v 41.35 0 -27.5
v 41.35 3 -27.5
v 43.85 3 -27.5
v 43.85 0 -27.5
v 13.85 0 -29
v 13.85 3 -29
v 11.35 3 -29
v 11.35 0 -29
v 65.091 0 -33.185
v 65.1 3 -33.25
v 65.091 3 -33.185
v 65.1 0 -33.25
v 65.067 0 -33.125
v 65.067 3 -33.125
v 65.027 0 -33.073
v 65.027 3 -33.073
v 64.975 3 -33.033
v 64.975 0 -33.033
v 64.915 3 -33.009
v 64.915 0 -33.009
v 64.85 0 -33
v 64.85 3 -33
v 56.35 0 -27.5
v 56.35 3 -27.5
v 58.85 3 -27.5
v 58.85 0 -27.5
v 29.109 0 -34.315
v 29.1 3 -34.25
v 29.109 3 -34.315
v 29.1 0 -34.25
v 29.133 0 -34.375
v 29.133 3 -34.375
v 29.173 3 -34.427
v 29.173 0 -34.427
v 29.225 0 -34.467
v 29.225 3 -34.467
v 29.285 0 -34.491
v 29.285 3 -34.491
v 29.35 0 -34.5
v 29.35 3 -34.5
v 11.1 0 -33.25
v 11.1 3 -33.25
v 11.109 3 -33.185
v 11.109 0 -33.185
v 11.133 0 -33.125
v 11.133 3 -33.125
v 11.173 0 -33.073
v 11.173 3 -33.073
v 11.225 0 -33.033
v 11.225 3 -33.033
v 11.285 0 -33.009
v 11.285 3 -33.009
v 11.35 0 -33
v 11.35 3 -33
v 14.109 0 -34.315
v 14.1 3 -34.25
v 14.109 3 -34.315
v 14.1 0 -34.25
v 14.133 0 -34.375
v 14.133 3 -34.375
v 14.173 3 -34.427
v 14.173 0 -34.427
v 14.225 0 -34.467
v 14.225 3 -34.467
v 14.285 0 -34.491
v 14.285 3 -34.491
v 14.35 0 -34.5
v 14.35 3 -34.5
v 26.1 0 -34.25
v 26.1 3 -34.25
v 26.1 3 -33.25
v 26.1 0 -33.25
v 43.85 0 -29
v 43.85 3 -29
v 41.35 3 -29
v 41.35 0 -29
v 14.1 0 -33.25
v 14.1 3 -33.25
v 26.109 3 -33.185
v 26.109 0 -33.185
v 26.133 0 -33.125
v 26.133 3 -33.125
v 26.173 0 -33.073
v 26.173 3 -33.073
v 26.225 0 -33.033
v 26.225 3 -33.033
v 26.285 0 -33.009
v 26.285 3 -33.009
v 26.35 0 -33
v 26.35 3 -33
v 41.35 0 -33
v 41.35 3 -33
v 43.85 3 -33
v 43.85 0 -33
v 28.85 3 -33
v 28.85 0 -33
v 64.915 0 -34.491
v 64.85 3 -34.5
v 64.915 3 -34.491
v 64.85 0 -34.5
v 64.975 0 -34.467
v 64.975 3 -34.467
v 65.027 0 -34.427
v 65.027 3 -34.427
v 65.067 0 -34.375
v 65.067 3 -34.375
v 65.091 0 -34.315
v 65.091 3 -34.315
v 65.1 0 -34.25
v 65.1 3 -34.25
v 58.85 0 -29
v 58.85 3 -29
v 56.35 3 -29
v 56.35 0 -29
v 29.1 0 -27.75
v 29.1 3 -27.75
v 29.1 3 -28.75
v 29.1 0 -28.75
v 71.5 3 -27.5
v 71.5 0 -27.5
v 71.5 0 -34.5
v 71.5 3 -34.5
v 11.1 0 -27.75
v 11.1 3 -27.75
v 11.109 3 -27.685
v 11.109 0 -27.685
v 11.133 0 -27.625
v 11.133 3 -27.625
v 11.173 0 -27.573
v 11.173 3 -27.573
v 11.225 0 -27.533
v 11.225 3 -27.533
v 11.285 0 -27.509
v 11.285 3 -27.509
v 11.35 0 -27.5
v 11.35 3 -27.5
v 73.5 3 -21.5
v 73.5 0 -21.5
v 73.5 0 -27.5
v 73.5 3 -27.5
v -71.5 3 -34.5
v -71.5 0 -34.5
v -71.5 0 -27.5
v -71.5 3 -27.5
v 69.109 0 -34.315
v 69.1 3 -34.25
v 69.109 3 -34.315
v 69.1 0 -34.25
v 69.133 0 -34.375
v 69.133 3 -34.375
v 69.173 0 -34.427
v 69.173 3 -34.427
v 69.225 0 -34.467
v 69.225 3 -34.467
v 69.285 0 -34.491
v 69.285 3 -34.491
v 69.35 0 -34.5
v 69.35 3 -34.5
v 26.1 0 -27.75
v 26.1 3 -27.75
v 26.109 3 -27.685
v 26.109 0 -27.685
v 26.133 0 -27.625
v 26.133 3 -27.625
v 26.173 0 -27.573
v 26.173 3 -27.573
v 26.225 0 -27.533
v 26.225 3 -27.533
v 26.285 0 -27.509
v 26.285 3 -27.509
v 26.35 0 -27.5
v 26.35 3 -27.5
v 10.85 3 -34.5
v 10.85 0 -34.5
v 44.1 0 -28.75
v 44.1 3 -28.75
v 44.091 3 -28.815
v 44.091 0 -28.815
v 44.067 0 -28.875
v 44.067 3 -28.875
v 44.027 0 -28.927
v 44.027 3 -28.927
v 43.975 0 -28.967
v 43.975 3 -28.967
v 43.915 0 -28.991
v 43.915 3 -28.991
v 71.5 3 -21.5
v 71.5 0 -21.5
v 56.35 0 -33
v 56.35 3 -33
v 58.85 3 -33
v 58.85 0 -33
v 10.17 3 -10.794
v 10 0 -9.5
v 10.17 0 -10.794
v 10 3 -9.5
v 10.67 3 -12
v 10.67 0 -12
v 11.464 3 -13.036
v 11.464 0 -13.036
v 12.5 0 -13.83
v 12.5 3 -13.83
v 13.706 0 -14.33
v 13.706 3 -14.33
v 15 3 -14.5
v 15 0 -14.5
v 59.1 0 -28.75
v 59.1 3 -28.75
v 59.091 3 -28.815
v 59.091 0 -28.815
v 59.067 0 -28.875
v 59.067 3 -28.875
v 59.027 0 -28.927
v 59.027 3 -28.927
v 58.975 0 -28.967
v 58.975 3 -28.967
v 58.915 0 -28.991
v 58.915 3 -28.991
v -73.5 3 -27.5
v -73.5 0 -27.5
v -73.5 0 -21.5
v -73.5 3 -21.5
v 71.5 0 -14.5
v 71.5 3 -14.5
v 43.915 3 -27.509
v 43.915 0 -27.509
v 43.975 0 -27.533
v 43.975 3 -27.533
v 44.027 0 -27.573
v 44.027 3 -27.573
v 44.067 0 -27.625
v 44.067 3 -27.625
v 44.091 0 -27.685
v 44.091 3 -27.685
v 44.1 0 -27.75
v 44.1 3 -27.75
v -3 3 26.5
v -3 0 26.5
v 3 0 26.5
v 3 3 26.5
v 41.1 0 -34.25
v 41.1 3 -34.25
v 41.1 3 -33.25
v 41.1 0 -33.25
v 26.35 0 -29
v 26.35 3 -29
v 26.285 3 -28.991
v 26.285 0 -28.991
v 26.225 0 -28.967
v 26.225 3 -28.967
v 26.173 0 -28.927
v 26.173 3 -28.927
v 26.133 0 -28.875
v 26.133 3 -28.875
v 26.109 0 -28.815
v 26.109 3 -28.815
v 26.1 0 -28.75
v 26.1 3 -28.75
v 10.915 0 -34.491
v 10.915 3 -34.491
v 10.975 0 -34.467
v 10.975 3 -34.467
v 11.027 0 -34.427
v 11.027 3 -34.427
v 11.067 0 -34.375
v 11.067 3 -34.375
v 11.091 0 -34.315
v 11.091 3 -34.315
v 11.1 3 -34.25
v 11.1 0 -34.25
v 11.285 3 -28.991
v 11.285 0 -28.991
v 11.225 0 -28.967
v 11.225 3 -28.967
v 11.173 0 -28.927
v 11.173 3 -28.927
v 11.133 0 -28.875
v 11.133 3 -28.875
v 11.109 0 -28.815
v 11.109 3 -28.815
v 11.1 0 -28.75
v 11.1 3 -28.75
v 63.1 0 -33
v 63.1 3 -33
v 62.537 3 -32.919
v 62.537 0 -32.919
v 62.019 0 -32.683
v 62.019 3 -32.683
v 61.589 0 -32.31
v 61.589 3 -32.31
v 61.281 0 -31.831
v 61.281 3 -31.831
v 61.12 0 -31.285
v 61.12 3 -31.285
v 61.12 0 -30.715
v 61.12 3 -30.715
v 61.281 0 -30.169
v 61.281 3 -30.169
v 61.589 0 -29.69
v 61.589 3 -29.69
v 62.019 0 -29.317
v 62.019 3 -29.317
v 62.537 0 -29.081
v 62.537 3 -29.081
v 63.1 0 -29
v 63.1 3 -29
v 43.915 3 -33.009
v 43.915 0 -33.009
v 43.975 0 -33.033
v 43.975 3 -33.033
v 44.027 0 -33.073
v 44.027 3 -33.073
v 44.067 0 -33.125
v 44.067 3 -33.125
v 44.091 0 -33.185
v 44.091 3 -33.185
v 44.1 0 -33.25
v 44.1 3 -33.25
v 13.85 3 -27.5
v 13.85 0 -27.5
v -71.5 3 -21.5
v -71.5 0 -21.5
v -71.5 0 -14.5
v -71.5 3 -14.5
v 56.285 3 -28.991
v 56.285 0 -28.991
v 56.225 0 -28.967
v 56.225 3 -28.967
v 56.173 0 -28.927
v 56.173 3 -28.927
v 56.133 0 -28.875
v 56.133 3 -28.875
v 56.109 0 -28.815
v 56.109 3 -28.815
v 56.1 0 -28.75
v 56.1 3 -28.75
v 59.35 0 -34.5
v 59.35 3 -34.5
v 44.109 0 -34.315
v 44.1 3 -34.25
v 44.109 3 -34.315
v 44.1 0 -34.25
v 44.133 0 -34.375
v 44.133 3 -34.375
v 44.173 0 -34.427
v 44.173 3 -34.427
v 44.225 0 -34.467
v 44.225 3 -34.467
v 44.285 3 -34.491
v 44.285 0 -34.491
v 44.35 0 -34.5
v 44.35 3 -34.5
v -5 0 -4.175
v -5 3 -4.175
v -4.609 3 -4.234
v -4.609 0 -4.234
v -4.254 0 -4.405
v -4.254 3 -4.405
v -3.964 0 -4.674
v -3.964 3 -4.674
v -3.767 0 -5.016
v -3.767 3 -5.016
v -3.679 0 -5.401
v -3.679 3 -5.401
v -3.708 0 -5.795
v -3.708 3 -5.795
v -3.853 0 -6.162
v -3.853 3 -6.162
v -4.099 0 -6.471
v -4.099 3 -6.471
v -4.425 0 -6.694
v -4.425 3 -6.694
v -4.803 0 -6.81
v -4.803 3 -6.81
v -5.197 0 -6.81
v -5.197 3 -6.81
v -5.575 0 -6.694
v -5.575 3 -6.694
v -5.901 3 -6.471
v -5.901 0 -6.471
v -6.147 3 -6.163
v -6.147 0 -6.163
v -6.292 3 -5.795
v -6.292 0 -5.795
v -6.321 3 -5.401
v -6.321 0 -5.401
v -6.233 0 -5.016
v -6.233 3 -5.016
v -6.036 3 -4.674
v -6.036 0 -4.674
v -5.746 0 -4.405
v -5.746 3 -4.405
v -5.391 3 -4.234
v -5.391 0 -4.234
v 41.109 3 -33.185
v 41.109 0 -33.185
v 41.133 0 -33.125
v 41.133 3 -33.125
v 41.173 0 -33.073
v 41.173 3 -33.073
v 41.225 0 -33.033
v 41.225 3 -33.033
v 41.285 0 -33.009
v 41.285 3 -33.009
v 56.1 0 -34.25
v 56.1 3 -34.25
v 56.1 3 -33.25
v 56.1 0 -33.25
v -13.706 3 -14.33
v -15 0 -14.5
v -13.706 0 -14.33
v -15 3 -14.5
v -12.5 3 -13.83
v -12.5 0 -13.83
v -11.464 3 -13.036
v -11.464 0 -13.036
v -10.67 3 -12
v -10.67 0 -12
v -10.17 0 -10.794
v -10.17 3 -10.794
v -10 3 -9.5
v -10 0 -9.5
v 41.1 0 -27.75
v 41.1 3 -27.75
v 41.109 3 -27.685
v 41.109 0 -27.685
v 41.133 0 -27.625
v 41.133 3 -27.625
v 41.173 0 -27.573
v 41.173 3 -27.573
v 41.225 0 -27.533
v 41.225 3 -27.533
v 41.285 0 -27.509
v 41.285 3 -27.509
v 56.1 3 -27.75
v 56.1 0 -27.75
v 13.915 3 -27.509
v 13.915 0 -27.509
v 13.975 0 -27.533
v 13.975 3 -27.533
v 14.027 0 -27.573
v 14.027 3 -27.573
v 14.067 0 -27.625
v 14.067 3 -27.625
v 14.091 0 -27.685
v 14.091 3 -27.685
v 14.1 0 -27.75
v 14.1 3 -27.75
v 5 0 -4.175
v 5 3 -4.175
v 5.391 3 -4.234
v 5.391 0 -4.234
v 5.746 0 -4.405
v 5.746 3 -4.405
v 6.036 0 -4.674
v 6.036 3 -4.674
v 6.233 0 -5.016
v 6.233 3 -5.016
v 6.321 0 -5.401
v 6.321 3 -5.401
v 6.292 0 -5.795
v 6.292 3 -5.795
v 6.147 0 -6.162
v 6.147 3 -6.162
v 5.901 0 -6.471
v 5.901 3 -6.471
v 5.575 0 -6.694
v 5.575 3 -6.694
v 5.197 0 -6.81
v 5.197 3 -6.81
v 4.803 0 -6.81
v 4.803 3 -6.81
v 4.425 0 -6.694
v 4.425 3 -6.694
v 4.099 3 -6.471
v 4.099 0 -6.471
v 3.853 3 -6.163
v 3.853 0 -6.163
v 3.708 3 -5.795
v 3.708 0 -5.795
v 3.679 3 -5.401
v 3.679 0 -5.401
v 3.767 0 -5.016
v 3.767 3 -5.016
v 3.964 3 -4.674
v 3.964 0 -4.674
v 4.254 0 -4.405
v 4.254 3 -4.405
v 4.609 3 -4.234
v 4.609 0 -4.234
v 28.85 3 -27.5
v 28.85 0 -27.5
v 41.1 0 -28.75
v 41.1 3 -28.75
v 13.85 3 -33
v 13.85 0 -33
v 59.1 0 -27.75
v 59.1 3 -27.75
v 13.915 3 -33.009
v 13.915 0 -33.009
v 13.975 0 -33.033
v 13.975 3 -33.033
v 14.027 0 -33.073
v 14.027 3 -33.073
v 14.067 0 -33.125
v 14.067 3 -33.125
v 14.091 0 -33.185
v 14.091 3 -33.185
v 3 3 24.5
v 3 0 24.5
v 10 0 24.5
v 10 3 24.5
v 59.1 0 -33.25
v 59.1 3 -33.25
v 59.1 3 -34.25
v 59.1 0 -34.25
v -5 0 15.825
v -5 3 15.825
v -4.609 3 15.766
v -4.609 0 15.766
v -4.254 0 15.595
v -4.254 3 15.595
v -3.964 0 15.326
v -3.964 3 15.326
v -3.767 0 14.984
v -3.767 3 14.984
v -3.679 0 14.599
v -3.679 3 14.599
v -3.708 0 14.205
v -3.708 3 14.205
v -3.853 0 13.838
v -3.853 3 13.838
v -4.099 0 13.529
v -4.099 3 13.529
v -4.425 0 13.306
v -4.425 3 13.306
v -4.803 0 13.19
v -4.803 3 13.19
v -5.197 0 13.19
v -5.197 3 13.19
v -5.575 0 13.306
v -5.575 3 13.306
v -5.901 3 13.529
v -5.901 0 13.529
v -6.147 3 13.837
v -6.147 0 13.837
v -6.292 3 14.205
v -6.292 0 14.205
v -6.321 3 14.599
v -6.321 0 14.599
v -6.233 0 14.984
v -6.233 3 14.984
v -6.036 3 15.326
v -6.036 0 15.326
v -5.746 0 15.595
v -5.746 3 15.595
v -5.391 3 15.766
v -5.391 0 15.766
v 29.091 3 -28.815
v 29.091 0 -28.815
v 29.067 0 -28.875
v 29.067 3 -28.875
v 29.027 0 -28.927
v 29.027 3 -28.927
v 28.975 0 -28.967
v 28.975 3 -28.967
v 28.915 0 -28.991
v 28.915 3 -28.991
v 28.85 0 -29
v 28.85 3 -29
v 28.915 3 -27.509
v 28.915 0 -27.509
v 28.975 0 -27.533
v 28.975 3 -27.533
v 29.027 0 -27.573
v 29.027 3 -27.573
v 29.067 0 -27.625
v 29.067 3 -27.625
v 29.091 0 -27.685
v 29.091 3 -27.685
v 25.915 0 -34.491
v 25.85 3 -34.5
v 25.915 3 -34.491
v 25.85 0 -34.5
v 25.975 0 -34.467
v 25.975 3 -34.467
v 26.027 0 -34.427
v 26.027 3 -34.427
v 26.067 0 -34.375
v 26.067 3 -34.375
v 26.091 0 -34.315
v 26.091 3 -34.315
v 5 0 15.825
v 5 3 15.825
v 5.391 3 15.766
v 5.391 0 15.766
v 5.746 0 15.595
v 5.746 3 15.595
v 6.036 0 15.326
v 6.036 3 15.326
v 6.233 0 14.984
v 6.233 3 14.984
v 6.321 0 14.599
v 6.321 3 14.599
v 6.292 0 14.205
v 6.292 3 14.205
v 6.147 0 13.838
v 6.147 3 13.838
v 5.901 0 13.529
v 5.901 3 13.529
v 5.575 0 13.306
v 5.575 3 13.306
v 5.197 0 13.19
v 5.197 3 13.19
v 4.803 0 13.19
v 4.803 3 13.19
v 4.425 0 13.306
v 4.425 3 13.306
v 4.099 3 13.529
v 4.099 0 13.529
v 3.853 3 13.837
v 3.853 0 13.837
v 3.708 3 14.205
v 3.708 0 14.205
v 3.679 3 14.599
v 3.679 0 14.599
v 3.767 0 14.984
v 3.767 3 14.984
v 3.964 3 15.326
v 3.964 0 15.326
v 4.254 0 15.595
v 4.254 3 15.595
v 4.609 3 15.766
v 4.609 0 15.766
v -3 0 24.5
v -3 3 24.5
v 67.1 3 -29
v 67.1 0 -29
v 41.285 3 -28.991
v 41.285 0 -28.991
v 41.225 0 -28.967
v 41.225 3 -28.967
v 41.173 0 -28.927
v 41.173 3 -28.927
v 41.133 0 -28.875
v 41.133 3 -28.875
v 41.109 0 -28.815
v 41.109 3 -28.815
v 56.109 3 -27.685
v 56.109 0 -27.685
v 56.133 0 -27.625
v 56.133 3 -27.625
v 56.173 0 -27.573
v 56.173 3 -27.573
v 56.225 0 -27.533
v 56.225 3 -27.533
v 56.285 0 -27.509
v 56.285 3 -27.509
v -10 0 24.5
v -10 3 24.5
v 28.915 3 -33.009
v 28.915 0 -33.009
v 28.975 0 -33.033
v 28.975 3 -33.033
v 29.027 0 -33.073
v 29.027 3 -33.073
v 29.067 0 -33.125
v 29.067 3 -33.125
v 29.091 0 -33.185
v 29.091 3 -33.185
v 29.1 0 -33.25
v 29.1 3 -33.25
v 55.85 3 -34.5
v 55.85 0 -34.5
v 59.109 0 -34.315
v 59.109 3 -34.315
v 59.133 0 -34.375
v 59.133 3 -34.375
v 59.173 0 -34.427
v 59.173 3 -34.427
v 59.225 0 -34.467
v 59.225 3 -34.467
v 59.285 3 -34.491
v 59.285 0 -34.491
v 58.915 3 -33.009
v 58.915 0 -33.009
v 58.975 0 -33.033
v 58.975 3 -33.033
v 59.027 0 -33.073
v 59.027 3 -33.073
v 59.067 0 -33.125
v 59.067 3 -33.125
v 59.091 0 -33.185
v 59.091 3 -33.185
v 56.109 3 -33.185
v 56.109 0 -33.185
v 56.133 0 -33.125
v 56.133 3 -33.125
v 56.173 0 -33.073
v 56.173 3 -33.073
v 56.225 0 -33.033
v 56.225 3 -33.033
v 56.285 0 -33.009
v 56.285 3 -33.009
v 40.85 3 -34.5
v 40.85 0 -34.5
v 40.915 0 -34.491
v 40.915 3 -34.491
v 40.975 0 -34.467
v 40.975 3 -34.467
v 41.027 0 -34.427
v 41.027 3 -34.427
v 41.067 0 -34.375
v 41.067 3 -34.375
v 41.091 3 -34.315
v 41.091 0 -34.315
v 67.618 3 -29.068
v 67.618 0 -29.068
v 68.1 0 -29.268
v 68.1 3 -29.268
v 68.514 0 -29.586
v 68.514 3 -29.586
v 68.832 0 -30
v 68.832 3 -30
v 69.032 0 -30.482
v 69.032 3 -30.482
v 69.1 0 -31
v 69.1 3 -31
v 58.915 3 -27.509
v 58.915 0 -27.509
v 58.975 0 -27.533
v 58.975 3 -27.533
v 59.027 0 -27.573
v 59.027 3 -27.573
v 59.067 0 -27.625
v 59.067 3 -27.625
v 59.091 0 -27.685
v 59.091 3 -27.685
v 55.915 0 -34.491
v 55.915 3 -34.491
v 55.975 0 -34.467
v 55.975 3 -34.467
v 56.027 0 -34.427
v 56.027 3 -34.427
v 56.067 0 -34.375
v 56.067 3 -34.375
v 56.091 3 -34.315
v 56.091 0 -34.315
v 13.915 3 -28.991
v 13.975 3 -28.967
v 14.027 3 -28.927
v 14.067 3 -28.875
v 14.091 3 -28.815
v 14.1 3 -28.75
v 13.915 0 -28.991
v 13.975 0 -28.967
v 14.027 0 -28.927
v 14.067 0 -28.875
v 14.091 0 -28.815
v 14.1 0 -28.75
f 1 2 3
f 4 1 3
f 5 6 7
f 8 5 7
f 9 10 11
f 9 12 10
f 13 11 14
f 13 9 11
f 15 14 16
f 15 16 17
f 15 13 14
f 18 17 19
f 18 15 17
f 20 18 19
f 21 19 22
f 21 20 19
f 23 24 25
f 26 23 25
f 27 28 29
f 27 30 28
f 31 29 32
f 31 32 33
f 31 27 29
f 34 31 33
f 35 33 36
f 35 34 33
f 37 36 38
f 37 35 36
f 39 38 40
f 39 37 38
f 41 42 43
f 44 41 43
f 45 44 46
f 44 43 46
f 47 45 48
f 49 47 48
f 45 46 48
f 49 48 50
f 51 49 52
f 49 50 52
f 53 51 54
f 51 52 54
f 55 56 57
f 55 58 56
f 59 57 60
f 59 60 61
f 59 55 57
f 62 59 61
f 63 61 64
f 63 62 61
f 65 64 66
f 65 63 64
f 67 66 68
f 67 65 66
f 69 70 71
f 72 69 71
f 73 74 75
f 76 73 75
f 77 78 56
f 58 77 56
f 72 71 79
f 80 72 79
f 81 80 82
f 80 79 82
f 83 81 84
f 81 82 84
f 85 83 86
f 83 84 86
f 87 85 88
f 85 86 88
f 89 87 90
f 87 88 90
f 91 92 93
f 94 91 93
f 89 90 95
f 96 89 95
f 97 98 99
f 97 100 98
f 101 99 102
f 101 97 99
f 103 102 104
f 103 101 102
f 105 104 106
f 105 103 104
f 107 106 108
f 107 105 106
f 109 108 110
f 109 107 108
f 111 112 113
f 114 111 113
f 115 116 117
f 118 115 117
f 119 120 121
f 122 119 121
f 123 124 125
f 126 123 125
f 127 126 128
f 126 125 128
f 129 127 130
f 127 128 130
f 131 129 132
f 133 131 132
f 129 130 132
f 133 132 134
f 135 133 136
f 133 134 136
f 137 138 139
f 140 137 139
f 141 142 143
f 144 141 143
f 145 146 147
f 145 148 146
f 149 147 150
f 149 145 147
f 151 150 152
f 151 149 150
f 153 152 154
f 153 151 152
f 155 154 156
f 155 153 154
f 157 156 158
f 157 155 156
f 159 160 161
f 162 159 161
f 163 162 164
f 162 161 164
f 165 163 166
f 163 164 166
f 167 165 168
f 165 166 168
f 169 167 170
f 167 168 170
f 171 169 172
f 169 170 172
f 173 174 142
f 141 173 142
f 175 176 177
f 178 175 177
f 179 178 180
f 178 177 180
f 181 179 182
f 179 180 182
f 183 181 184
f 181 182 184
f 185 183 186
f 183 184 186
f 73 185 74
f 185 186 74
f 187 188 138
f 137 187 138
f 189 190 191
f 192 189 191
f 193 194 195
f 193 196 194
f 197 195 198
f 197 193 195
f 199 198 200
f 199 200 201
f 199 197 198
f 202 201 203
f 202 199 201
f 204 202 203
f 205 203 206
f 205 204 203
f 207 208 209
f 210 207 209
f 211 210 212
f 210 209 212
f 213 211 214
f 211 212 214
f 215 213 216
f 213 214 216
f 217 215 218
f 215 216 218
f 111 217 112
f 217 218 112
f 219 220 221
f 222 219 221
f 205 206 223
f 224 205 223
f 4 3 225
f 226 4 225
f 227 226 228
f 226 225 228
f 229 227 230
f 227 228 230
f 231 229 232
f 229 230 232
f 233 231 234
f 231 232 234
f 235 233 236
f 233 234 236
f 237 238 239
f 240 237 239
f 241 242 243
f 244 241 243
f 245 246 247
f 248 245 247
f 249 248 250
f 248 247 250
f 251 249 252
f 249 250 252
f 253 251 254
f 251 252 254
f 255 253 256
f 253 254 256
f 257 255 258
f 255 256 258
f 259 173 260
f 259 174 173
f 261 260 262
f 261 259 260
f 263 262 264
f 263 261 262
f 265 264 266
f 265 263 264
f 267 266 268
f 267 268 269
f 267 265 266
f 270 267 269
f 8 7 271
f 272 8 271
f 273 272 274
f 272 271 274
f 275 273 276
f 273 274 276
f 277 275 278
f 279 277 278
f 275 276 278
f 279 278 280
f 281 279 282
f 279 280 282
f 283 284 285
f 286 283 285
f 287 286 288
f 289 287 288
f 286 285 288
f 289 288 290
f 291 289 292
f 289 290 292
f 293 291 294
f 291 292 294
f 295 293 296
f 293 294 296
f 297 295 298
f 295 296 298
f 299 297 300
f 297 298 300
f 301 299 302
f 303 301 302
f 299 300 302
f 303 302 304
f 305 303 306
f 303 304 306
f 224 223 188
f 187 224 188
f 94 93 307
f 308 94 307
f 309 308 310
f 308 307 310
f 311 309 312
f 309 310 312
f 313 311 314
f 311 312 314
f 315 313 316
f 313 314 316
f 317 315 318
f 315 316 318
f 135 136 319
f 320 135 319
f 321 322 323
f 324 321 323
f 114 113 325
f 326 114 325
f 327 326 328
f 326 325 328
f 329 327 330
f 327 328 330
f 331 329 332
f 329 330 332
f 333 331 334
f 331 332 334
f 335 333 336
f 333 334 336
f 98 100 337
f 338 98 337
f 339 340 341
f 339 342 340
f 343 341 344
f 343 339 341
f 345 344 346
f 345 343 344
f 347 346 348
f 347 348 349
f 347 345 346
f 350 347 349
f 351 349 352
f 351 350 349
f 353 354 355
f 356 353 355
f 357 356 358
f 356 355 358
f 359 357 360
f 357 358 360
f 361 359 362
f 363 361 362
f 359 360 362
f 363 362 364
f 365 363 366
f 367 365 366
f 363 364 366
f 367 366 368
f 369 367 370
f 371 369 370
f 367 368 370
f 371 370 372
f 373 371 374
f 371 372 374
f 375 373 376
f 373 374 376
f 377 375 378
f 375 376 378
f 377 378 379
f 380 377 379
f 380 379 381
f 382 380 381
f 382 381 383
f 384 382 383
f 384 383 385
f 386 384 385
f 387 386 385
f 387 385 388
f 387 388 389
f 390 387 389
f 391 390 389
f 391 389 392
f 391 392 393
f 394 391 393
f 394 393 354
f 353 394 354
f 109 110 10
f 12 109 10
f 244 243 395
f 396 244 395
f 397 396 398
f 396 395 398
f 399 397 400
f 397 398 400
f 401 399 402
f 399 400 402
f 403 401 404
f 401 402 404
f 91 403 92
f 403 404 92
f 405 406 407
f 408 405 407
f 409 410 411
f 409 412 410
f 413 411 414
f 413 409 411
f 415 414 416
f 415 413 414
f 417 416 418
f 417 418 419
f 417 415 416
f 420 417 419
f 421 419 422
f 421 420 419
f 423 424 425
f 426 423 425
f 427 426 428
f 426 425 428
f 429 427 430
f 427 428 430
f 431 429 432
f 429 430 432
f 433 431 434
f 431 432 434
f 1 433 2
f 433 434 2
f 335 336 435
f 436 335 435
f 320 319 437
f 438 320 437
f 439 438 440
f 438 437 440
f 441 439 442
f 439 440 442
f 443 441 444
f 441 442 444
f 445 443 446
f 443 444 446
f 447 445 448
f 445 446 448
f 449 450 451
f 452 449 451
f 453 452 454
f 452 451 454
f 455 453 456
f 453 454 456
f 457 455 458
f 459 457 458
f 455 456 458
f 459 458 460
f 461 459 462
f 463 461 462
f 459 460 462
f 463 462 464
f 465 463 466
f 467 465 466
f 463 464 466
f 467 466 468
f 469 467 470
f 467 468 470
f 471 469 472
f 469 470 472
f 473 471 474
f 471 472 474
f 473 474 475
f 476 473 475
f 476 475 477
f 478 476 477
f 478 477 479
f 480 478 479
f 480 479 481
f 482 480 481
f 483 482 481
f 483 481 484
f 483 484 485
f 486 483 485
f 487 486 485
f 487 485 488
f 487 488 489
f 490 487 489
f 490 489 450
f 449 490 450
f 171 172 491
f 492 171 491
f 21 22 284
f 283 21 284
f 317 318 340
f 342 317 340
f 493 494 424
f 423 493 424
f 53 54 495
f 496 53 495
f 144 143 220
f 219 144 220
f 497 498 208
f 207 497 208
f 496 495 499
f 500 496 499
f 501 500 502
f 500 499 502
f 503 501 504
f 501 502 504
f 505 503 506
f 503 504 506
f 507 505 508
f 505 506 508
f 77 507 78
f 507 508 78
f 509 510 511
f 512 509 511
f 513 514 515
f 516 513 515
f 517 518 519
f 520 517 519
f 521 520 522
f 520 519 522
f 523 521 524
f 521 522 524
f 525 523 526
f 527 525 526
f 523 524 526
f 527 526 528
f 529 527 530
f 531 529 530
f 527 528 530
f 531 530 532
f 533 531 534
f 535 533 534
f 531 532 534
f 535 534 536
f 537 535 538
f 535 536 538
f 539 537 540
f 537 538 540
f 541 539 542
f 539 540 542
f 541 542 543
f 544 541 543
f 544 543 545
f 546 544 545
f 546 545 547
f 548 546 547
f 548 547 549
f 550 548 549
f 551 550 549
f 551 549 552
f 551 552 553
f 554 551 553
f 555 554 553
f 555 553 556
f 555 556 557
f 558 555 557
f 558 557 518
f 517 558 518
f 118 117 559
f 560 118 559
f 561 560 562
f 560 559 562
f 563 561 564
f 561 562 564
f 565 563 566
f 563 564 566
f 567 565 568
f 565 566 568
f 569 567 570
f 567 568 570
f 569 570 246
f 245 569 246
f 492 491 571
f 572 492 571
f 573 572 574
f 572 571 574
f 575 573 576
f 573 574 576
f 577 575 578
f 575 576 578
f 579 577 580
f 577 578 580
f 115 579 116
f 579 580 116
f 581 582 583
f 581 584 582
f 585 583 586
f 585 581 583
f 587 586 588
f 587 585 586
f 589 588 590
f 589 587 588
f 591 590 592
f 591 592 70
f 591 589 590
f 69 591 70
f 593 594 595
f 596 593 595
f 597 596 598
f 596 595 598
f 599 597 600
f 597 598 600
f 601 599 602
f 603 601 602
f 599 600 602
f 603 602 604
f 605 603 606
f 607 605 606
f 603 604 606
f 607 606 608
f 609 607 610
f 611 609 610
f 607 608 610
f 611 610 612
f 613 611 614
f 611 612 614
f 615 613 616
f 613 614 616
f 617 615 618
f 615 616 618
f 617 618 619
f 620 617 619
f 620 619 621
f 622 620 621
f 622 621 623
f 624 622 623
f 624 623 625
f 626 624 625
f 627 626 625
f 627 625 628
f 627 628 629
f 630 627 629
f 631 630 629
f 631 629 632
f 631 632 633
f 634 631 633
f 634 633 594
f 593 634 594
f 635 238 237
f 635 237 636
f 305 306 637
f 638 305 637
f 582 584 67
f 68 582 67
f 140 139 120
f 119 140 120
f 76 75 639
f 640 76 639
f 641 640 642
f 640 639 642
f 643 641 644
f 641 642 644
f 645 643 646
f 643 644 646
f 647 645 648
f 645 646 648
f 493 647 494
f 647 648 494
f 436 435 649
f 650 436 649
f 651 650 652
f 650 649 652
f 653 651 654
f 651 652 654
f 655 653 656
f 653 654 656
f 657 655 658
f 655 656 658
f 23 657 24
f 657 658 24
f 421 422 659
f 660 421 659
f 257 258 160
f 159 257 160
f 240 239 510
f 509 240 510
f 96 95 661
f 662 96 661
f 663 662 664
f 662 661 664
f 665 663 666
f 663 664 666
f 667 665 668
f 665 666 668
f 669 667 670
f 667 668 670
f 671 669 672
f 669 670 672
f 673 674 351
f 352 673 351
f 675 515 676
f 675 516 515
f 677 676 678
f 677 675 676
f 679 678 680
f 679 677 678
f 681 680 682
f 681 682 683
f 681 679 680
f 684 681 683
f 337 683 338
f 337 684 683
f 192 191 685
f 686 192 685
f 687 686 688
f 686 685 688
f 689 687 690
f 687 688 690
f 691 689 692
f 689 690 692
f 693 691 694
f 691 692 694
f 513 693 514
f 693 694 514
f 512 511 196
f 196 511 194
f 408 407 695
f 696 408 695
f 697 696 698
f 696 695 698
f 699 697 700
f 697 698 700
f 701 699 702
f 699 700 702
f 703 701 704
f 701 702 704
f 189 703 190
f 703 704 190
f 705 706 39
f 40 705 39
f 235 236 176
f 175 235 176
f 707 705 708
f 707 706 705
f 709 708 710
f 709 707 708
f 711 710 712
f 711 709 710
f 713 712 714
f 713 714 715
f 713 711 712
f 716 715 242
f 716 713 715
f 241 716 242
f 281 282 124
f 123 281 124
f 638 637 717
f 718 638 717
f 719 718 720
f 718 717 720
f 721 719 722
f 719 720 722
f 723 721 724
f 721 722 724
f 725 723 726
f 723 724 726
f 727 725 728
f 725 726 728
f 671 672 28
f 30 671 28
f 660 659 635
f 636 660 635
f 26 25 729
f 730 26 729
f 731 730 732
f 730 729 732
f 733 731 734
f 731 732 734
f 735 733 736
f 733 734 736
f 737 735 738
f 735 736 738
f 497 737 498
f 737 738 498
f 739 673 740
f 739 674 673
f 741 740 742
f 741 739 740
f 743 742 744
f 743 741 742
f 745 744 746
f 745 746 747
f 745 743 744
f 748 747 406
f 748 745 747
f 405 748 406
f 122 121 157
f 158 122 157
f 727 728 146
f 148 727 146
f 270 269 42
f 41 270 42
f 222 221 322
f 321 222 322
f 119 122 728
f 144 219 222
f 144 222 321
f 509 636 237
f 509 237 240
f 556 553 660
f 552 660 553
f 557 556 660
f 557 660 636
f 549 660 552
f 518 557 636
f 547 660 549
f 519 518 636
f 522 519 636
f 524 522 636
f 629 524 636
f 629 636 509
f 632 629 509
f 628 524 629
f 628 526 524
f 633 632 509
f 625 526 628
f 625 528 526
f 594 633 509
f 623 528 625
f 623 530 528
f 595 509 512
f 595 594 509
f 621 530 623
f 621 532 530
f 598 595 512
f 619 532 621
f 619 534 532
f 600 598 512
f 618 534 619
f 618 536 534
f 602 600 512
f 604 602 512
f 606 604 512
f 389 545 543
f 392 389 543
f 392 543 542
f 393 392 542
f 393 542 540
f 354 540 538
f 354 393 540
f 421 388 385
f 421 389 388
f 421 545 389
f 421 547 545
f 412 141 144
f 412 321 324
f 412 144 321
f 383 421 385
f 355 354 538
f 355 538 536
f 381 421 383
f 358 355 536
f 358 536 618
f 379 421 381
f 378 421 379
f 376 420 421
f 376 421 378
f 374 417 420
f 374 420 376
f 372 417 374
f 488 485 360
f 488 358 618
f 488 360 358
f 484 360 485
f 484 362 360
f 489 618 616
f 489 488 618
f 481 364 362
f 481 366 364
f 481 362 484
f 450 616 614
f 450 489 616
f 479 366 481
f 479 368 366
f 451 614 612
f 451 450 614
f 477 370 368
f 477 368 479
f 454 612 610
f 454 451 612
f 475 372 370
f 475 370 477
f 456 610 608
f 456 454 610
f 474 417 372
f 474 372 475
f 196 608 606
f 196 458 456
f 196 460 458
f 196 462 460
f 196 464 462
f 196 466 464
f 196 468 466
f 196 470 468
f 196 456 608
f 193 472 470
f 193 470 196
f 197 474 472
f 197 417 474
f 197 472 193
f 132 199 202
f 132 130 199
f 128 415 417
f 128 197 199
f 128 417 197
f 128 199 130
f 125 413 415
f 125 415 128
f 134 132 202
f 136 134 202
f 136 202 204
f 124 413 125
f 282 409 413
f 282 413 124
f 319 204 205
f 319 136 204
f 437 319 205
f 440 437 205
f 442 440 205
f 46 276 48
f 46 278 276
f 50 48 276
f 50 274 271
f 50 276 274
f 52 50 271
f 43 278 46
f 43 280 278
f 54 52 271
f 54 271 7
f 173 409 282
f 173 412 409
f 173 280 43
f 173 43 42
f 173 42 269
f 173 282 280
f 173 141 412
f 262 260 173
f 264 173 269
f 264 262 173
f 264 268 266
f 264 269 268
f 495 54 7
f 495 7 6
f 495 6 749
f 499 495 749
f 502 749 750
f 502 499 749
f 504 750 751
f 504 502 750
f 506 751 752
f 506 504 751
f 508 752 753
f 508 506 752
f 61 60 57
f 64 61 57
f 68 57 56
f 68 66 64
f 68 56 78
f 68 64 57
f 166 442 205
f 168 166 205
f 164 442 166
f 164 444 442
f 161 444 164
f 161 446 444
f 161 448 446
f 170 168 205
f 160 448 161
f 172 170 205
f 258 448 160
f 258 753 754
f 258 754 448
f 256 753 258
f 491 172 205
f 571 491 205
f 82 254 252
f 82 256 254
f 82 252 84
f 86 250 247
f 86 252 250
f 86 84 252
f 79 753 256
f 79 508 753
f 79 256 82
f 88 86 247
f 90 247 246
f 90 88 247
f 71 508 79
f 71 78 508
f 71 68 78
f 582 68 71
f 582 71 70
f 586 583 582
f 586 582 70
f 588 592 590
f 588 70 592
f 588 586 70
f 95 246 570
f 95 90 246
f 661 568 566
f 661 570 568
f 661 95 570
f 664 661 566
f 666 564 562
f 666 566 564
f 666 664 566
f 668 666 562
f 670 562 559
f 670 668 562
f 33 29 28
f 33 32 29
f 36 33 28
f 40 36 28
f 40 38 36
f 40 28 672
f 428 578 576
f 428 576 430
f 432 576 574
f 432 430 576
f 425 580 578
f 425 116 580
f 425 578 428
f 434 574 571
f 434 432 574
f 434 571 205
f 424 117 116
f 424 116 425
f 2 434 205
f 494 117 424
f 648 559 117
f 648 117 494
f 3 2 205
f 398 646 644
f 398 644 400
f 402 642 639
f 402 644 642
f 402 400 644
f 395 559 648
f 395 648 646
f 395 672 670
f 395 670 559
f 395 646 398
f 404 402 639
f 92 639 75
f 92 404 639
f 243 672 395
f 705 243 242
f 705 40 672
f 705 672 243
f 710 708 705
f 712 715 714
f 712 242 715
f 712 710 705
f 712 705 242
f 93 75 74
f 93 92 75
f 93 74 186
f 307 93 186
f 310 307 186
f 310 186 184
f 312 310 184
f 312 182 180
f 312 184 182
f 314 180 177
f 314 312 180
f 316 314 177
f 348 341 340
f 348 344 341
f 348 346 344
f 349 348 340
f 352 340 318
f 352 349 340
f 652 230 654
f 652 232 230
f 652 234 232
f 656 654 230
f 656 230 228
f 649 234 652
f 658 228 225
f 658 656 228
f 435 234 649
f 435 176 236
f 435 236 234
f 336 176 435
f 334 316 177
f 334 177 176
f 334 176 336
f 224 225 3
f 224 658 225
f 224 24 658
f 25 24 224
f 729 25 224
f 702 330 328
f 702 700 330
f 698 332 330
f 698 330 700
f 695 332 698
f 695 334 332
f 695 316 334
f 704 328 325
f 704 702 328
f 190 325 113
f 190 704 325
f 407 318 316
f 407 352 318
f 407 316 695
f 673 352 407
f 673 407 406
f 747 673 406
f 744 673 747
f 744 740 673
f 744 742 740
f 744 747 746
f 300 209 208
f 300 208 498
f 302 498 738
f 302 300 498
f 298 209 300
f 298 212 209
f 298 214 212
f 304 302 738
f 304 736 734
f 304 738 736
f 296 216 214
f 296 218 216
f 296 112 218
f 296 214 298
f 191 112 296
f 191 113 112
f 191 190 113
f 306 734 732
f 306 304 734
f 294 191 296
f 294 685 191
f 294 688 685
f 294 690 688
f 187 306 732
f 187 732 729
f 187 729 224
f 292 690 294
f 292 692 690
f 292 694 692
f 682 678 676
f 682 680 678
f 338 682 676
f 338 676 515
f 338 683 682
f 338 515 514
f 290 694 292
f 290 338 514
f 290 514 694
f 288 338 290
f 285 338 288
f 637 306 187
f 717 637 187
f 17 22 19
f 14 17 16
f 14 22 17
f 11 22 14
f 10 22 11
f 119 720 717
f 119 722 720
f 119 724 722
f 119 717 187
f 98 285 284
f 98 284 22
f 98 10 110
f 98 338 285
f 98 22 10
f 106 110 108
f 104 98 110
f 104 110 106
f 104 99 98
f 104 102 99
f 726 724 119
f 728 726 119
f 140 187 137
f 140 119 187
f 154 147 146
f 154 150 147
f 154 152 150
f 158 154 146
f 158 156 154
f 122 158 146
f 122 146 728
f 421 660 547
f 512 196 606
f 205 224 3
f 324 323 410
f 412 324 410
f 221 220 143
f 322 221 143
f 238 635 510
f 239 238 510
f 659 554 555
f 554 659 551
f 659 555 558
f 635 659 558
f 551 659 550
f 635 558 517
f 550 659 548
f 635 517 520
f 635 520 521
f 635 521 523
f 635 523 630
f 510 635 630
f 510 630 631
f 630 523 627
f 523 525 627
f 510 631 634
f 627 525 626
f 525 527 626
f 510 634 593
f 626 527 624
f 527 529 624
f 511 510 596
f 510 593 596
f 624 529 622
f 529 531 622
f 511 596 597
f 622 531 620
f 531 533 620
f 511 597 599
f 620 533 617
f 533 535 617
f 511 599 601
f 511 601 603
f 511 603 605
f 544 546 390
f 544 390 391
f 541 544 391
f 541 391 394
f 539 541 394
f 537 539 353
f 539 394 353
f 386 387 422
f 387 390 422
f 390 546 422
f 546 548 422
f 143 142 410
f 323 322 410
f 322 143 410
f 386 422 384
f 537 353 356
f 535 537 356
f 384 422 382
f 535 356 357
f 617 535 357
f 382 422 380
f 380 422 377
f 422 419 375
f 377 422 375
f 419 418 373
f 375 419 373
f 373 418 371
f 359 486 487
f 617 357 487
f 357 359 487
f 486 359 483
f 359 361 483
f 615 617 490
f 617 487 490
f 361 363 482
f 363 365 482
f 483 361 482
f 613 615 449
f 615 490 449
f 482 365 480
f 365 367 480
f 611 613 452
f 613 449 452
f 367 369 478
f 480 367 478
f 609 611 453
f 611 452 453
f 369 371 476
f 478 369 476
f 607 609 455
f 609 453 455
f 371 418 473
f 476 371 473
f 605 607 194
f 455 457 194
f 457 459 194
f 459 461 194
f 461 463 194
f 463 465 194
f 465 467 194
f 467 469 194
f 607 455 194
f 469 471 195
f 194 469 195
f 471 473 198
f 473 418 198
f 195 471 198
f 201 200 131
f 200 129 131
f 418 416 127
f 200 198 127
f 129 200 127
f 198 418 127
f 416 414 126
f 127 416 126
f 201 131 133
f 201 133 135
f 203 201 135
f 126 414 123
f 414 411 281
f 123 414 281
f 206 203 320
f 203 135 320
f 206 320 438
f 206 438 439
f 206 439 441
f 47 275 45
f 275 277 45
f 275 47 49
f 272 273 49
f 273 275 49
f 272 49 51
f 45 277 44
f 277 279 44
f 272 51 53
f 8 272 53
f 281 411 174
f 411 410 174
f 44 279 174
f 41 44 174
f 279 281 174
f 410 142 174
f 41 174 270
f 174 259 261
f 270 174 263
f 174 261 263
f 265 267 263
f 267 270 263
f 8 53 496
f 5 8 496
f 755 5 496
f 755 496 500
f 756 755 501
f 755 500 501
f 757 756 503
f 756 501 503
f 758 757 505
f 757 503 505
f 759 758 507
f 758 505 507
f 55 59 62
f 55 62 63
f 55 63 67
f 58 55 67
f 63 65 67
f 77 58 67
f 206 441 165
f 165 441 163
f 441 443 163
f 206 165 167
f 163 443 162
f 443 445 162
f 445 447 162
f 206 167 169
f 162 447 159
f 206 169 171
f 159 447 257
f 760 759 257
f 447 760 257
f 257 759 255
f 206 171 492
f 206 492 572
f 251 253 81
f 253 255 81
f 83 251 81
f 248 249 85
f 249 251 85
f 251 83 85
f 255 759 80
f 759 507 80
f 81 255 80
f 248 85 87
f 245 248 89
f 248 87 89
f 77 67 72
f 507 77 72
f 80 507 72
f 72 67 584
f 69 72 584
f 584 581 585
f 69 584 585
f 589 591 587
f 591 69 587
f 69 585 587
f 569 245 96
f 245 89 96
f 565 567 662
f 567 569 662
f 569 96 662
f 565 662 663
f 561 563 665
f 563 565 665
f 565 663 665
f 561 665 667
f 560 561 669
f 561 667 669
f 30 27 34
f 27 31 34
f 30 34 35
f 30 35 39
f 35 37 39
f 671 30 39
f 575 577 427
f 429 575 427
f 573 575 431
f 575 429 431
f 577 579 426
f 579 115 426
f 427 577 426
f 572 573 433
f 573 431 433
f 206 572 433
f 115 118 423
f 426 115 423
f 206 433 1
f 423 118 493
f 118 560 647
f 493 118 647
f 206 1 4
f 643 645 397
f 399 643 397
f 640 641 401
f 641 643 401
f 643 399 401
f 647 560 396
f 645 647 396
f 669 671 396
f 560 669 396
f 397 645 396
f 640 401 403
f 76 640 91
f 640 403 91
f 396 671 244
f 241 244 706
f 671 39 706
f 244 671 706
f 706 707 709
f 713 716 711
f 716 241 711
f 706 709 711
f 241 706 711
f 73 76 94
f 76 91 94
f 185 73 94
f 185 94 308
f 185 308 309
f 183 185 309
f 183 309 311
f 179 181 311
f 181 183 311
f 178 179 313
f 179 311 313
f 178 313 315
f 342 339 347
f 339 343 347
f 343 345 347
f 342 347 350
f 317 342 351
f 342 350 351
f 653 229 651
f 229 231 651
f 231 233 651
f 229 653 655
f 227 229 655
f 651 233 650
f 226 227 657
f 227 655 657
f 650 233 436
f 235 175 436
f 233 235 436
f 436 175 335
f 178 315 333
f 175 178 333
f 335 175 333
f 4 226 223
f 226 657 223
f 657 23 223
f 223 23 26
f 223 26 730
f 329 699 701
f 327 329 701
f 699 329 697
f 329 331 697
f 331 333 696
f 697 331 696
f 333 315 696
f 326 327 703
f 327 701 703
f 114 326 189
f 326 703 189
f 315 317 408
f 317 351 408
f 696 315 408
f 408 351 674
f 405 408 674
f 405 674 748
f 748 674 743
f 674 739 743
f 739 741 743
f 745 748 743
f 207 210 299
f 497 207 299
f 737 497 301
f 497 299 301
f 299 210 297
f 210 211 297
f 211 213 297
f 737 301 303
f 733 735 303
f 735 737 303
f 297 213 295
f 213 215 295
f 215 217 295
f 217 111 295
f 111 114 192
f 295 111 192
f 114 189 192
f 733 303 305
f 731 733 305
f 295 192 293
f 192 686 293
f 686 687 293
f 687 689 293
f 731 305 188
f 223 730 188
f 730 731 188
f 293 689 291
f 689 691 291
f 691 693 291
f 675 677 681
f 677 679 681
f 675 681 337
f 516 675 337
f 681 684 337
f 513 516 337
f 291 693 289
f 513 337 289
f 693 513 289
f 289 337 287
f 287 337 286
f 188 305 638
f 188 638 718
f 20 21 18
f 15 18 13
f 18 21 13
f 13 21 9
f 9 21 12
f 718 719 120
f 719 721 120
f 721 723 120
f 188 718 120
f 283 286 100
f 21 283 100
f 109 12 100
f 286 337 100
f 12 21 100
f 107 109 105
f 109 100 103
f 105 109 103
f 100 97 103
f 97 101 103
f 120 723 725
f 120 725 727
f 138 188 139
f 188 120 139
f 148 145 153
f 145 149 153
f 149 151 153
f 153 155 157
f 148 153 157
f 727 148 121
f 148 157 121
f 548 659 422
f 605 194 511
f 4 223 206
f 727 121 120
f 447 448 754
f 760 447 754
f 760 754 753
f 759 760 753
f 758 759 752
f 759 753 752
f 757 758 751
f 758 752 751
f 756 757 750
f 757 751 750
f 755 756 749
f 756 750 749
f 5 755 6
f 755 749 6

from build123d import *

# Parameters (mm, degrees)
BOSS_EXTRUDE1_DEPTH = 3
FILLET1_R           = 5
CUT_EXTRUDE1_REACH  = 83.25
SKETCH2_R           = 1.325
CUT_EXTRUDE3_REACH  = 83.25
FILLET2_R           = 0.25


with BuildPart() as part:
    # Sketch1 → Boss-Extrude1 (new body)
    with BuildSketch(Plane(origin=(0, 0, 0), x_dir=(1, 0, 0), z_dir=(0, 1, 0))):
        Polygon((-71.5, 34.5), (-71.5, 27.5), (-73.5, 27.5), (-73.5, 21.5), (-71.5, 21.5), (-71.5, 14.5), (-10, 14.5), (-10, -24.5), (-3, -24.5), (-3, -26.5), (3, -26.5), (3, -24.5), (10, -24.5), (10, 14.5), (71.5, 14.5), (71.5, 21.5), (73.5, 21.5), (73.5, 27.5), (71.5, 27.5), (71.5, 34.5), align=None)
    extrude(amount=BOSS_EXTRUDE1_DEPTH)

    # Fillet1
    fillet1_edges = [part.edges().sort_by_distance(p)[0] for p in [
        (-10, 1.5, -14.5),
        (10, 1.5, -14.5),
    ]]
    fillet(fillet1_edges, radius=FILLET1_R)

    # Sketch2 → Cut-Extrude1 (cut, up to next)
    with BuildSketch(Plane(origin=(0, 3, 0), x_dir=(1, 0, 0), z_dir=(0, 1, 0)), mode=Mode.PRIVATE) as cut_extrude1_sk1:
        with Locations((-5, -14.5)):
            Circle(SKETCH2_R)
    cut_extrude1_tool1 = extrude(cut_extrude1_sk1.sketch, amount=-CUT_EXTRUDE1_REACH, mode=Mode.PRIVATE) & part.part
    # Sketch2 → Cut-Extrude1 (cut, up to next)
    with BuildSketch(Plane(origin=(0, 3, 0), x_dir=(1, 0, 0), z_dir=(0, 1, 0)), mode=Mode.PRIVATE) as cut_extrude1_sk2:
        with Locations((-5, 5.5)):
            Circle(SKETCH2_R)
    cut_extrude1_tool2 = extrude(cut_extrude1_sk2.sketch, amount=-CUT_EXTRUDE1_REACH, mode=Mode.PRIVATE) & part.part
    # Sketch2 → Cut-Extrude1 (cut, up to next)
    with BuildSketch(Plane(origin=(0, 3, 0), x_dir=(1, 0, 0), z_dir=(0, 1, 0)), mode=Mode.PRIVATE) as cut_extrude1_sk3:
        with Locations((5, 5.5)):
            Circle(SKETCH2_R)
    cut_extrude1_tool3 = extrude(cut_extrude1_sk3.sketch, amount=-CUT_EXTRUDE1_REACH, mode=Mode.PRIVATE) & part.part
    # Sketch2 → Cut-Extrude1 (cut, up to next)
    with BuildSketch(Plane(origin=(0, 3, 0), x_dir=(1, 0, 0), z_dir=(0, 1, 0)), mode=Mode.PRIVATE) as cut_extrude1_sk4:
        with Locations((5, -14.5)):
            Circle(SKETCH2_R)
    cut_extrude1_tool4 = extrude(cut_extrude1_sk4.sketch, amount=-CUT_EXTRUDE1_REACH, mode=Mode.PRIVATE) & part.part
    add(cut_extrude1_tool1.solids().sort_by_distance((-5, 3, 14.5))[0], mode=Mode.SUBTRACT)
    add(cut_extrude1_tool2.solids().sort_by_distance((-5, 3, -5.5))[0], mode=Mode.SUBTRACT)
    add(cut_extrude1_tool3.solids().sort_by_distance((5, 3, -5.5))[0], mode=Mode.SUBTRACT)
    add(cut_extrude1_tool4.solids().sort_by_distance((5, 3, 14.5))[0], mode=Mode.SUBTRACT)

    # Sketch3 → Cut-Extrude3 (cut, up to next)
    with BuildSketch(Plane(origin=(0, 3, 0), x_dir=(1, 0, 0), z_dir=(0, 1, 0)), mode=Mode.PRIVATE) as cut_extrude3_sk1:
        with BuildLine():
            Line((59.1, 34.5), (56.1, 34.5))
            Line((56.1, 34.5), (56.1, 33.25))
            ThreePointArc((56.1, 33.25), (56.173223305, 33.073223305), (56.35, 33))
            Line((56.35, 33), (58.85, 33))
            ThreePointArc((58.85, 33), (59.026776695, 33.073223305), (59.1, 33.25))
            Line((59.1, 33.25), (59.1, 34.5))
        make_face()
    cut_extrude3_tool1 = extrude(cut_extrude3_sk1.sketch, amount=-CUT_EXTRUDE3_REACH, mode=Mode.PRIVATE) & part.part
    # Sketch3 → Cut-Extrude3 (cut, up to next)
    with BuildSketch(Plane(origin=(0, 3, 0), x_dir=(1, 0, 0), z_dir=(0, 1, 0)), mode=Mode.PRIVATE) as cut_extrude3_sk2:
        with BuildLine():
            Line((65.1, 33), (63.1, 33))
            ThreePointArc((63.1, 33), (61.1, 31), (63.1, 29))
            Line((63.1, 29), (67.1, 29))
            ThreePointArc((67.1, 29), (68.514213562, 29.585786438), (69.1, 31))
            Line((69.1, 31), (69.1, 34.5))
            Line((69.1, 34.5), (65.1, 34.5))
            Line((65.1, 34.5), (65.1, 33))
        make_face()
    cut_extrude3_tool2 = extrude(cut_extrude3_sk2.sketch, amount=-CUT_EXTRUDE3_REACH, mode=Mode.PRIVATE) & part.part
    # Sketch3 → Cut-Extrude3 (cut, up to next)
    with BuildSketch(Plane(origin=(0, 3, 0), x_dir=(1, 0, 0), z_dir=(0, 1, 0)), mode=Mode.PRIVATE) as cut_extrude3_sk3:
        with BuildLine():
            Line((56.1, 28.75), (56.1, 27.75))
            ThreePointArc((56.1, 27.75), (56.173223305, 27.573223305), (56.35, 27.5))
            Line((56.35, 27.5), (58.85, 27.5))
            ThreePointArc((58.85, 27.5), (59.026776695, 27.573223305), (59.1, 27.75))
            Line((59.1, 27.75), (59.1, 28.75))
            ThreePointArc((59.1, 28.75), (59.026776695, 28.926776695), (58.85, 29))
            Line((58.85, 29), (56.35, 29))
            ThreePointArc((56.35, 29), (56.173223305, 28.926776695), (56.1, 28.75))
        make_face()
    cut_extrude3_tool3 = extrude(cut_extrude3_sk3.sketch, amount=-CUT_EXTRUDE3_REACH, mode=Mode.PRIVATE) & part.part
    # Sketch3 → Cut-Extrude3 (cut, up to next)
    with BuildSketch(Plane(origin=(0, 3, 0), x_dir=(1, 0, 0), z_dir=(0, 1, 0)), mode=Mode.PRIVATE) as cut_extrude3_sk4:
        with BuildLine():
            ThreePointArc((41.1, 27.75), (41.173223305, 27.573223305), (41.35, 27.5))
            Line((41.35, 27.5), (43.85, 27.5))
            ThreePointArc((43.85, 27.5), (44.026776695, 27.573223305), (44.1, 27.75))
            Line((44.1, 27.75), (44.1, 28.75))
            ThreePointArc((44.1, 28.75), (44.026776695, 28.926776695), (43.85, 29))
            Line((43.85, 29), (41.35, 29))
            ThreePointArc((41.35, 29), (41.173223305, 28.926776695), (41.1, 28.75))
            Line((41.1, 28.75), (41.1, 27.75))
        make_face()
    cut_extrude3_tool4 = extrude(cut_extrude3_sk4.sketch, amount=-CUT_EXTRUDE3_REACH, mode=Mode.PRIVATE) & part.part
    # Sketch3 → Cut-Extrude3 (cut, up to next)
    with BuildSketch(Plane(origin=(0, 3, 0), x_dir=(1, 0, 0), z_dir=(0, 1, 0)), mode=Mode.PRIVATE) as cut_extrude3_sk5:
        with BuildLine():
            ThreePointArc((41.1, 33.25), (41.173223305, 33.073223305), (41.35, 33))
            Line((41.35, 33), (43.85, 33))
            ThreePointArc((43.85, 33), (44.026776695, 33.073223305), (44.1, 33.25))
            Line((44.1, 33.25), (44.1, 34.5))
            Line((44.1, 34.5), (41.1, 34.5))
            Line((41.1, 34.5), (41.1, 33.25))
        make_face()
    cut_extrude3_tool5 = extrude(cut_extrude3_sk5.sketch, amount=-CUT_EXTRUDE3_REACH, mode=Mode.PRIVATE) & part.part
    # Sketch3 → Cut-Extrude3 (cut, up to next)
    with BuildSketch(Plane(origin=(0, 3, 0), x_dir=(1, 0, 0), z_dir=(0, 1, 0)), mode=Mode.PRIVATE) as cut_extrude3_sk6:
        with BuildLine():
            ThreePointArc((26.1, 27.75), (26.173223305, 27.573223305), (26.35, 27.5))
            Line((26.35, 27.5), (28.85, 27.5))
            ThreePointArc((28.85, 27.5), (29.026776695, 27.573223305), (29.1, 27.75))
            Line((29.1, 27.75), (29.1, 28.75))
            ThreePointArc((29.1, 28.75), (29.026776695, 28.926776695), (28.85, 29))
            Line((28.85, 29), (26.35, 29))
            ThreePointArc((26.35, 29), (26.173223305, 28.926776695), (26.1, 28.75))
            Line((26.1, 28.75), (26.1, 27.75))
        make_face()
    cut_extrude3_tool6 = extrude(cut_extrude3_sk6.sketch, amount=-CUT_EXTRUDE3_REACH, mode=Mode.PRIVATE) & part.part
    # Sketch3 → Cut-Extrude3 (cut, up to next)
    with BuildSketch(Plane(origin=(0, 3, 0), x_dir=(1, 0, 0), z_dir=(0, 1, 0)), mode=Mode.PRIVATE) as cut_extrude3_sk7:
        with BuildLine():
            ThreePointArc((26.1, 33.25), (26.173223305, 33.073223305), (26.35, 33))
            Line((26.35, 33), (28.85, 33))
            ThreePointArc((28.85, 33), (29.026776695, 33.073223305), (29.1, 33.25))
            Line((29.1, 33.25), (29.1, 34.5))
            Line((29.1, 34.5), (26.1, 34.5))
            Line((26.1, 34.5), (26.1, 33.25))
        make_face()
    cut_extrude3_tool7 = extrude(cut_extrude3_sk7.sketch, amount=-CUT_EXTRUDE3_REACH, mode=Mode.PRIVATE) & part.part
    # Sketch3 → Cut-Extrude3 (cut, up to next)
    with BuildSketch(Plane(origin=(0, 3, 0), x_dir=(1, 0, 0), z_dir=(0, 1, 0)), mode=Mode.PRIVATE) as cut_extrude3_sk8:
        with BuildLine():
            ThreePointArc((11.1, 27.75), (11.173223305, 27.573223305), (11.35, 27.5))
            Line((11.35, 27.5), (13.85, 27.5))
            ThreePointArc((13.85, 27.5), (14.026776695, 27.573223305), (14.1, 27.75))
            Line((14.1, 27.75), (14.1, 28.75))
            ThreePointArc((14.1, 28.75), (14.026776695, 28.926776695), (13.85, 29))
            Line((13.85, 29), (11.35, 29))
            ThreePointArc((11.35, 29), (11.173223305, 28.926776695), (11.1, 28.75))
            Line((11.1, 28.75), (11.1, 27.75))
        make_face()
    cut_extrude3_tool8 = extrude(cut_extrude3_sk8.sketch, amount=-CUT_EXTRUDE3_REACH, mode=Mode.PRIVATE) & part.part
    # Sketch3 → Cut-Extrude3 (cut, up to next)
    with BuildSketch(Plane(origin=(0, 3, 0), x_dir=(1, 0, 0), z_dir=(0, 1, 0)), mode=Mode.PRIVATE) as cut_extrude3_sk9:
        with BuildLine():
            ThreePointArc((11.1, 33.25), (11.173223305, 33.073223305), (11.35, 33))
            Line((11.35, 33), (13.85, 33))
            ThreePointArc((13.85, 33), (14.026776695, 33.073223305), (14.1, 33.25))
            Line((14.1, 33.25), (14.1, 34.5))
            Line((14.1, 34.5), (11.1, 34.5))
            Line((11.1, 34.5), (11.1, 33.25))
        make_face()
    cut_extrude3_tool9 = extrude(cut_extrude3_sk9.sketch, amount=-CUT_EXTRUDE3_REACH, mode=Mode.PRIVATE) & part.part
    add(cut_extrude3_tool1.solids().sort_by_distance((57.6, 3, -33.754163))[0], mode=Mode.SUBTRACT)
    add(cut_extrude3_tool2.solids().sort_by_distance((65.524848, 3, -31.503414))[0], mode=Mode.SUBTRACT)
    add(cut_extrude3_tool3.solids().sort_by_distance((57.6, 3, -28.25))[0], mode=Mode.SUBTRACT)
    add(cut_extrude3_tool4.solids().sort_by_distance((42.6, 3, -28.25))[0], mode=Mode.SUBTRACT)
    add(cut_extrude3_tool5.solids().sort_by_distance((42.6, 3, -33.754163))[0], mode=Mode.SUBTRACT)
    add(cut_extrude3_tool6.solids().sort_by_distance((27.6, 3, -28.25))[0], mode=Mode.SUBTRACT)
    add(cut_extrude3_tool7.solids().sort_by_distance((27.6, 3, -33.754163))[0], mode=Mode.SUBTRACT)
    add(cut_extrude3_tool8.solids().sort_by_distance((12.6, 3, -28.25))[0], mode=Mode.SUBTRACT)
    add(cut_extrude3_tool9.solids().sort_by_distance((12.6, 3, -33.754163))[0], mode=Mode.SUBTRACT)

    # Fillet2
    fillet2_edges = [part.edges().sort_by_distance(p)[0] for p in [
        (26.1, 1.5, -34.5),
        (29.1, 1.5, -34.5),
        (41.1, 1.5, -34.5),
        (44.1, 1.5, -34.5),
        (56.1, 1.5, -34.5),
        (59.1, 1.5, -34.5),
        (69.1, 1.5, -34.5),
        (65.1, 1.5, -34.5),
        (65.1, 1.5, -33),
        (14.1, 1.5, -34.5),
        (11.1, 1.5, -34.5),
    ]]
    fillet(fillet2_edges, radius=FILLET2_R)


solid = part.part
